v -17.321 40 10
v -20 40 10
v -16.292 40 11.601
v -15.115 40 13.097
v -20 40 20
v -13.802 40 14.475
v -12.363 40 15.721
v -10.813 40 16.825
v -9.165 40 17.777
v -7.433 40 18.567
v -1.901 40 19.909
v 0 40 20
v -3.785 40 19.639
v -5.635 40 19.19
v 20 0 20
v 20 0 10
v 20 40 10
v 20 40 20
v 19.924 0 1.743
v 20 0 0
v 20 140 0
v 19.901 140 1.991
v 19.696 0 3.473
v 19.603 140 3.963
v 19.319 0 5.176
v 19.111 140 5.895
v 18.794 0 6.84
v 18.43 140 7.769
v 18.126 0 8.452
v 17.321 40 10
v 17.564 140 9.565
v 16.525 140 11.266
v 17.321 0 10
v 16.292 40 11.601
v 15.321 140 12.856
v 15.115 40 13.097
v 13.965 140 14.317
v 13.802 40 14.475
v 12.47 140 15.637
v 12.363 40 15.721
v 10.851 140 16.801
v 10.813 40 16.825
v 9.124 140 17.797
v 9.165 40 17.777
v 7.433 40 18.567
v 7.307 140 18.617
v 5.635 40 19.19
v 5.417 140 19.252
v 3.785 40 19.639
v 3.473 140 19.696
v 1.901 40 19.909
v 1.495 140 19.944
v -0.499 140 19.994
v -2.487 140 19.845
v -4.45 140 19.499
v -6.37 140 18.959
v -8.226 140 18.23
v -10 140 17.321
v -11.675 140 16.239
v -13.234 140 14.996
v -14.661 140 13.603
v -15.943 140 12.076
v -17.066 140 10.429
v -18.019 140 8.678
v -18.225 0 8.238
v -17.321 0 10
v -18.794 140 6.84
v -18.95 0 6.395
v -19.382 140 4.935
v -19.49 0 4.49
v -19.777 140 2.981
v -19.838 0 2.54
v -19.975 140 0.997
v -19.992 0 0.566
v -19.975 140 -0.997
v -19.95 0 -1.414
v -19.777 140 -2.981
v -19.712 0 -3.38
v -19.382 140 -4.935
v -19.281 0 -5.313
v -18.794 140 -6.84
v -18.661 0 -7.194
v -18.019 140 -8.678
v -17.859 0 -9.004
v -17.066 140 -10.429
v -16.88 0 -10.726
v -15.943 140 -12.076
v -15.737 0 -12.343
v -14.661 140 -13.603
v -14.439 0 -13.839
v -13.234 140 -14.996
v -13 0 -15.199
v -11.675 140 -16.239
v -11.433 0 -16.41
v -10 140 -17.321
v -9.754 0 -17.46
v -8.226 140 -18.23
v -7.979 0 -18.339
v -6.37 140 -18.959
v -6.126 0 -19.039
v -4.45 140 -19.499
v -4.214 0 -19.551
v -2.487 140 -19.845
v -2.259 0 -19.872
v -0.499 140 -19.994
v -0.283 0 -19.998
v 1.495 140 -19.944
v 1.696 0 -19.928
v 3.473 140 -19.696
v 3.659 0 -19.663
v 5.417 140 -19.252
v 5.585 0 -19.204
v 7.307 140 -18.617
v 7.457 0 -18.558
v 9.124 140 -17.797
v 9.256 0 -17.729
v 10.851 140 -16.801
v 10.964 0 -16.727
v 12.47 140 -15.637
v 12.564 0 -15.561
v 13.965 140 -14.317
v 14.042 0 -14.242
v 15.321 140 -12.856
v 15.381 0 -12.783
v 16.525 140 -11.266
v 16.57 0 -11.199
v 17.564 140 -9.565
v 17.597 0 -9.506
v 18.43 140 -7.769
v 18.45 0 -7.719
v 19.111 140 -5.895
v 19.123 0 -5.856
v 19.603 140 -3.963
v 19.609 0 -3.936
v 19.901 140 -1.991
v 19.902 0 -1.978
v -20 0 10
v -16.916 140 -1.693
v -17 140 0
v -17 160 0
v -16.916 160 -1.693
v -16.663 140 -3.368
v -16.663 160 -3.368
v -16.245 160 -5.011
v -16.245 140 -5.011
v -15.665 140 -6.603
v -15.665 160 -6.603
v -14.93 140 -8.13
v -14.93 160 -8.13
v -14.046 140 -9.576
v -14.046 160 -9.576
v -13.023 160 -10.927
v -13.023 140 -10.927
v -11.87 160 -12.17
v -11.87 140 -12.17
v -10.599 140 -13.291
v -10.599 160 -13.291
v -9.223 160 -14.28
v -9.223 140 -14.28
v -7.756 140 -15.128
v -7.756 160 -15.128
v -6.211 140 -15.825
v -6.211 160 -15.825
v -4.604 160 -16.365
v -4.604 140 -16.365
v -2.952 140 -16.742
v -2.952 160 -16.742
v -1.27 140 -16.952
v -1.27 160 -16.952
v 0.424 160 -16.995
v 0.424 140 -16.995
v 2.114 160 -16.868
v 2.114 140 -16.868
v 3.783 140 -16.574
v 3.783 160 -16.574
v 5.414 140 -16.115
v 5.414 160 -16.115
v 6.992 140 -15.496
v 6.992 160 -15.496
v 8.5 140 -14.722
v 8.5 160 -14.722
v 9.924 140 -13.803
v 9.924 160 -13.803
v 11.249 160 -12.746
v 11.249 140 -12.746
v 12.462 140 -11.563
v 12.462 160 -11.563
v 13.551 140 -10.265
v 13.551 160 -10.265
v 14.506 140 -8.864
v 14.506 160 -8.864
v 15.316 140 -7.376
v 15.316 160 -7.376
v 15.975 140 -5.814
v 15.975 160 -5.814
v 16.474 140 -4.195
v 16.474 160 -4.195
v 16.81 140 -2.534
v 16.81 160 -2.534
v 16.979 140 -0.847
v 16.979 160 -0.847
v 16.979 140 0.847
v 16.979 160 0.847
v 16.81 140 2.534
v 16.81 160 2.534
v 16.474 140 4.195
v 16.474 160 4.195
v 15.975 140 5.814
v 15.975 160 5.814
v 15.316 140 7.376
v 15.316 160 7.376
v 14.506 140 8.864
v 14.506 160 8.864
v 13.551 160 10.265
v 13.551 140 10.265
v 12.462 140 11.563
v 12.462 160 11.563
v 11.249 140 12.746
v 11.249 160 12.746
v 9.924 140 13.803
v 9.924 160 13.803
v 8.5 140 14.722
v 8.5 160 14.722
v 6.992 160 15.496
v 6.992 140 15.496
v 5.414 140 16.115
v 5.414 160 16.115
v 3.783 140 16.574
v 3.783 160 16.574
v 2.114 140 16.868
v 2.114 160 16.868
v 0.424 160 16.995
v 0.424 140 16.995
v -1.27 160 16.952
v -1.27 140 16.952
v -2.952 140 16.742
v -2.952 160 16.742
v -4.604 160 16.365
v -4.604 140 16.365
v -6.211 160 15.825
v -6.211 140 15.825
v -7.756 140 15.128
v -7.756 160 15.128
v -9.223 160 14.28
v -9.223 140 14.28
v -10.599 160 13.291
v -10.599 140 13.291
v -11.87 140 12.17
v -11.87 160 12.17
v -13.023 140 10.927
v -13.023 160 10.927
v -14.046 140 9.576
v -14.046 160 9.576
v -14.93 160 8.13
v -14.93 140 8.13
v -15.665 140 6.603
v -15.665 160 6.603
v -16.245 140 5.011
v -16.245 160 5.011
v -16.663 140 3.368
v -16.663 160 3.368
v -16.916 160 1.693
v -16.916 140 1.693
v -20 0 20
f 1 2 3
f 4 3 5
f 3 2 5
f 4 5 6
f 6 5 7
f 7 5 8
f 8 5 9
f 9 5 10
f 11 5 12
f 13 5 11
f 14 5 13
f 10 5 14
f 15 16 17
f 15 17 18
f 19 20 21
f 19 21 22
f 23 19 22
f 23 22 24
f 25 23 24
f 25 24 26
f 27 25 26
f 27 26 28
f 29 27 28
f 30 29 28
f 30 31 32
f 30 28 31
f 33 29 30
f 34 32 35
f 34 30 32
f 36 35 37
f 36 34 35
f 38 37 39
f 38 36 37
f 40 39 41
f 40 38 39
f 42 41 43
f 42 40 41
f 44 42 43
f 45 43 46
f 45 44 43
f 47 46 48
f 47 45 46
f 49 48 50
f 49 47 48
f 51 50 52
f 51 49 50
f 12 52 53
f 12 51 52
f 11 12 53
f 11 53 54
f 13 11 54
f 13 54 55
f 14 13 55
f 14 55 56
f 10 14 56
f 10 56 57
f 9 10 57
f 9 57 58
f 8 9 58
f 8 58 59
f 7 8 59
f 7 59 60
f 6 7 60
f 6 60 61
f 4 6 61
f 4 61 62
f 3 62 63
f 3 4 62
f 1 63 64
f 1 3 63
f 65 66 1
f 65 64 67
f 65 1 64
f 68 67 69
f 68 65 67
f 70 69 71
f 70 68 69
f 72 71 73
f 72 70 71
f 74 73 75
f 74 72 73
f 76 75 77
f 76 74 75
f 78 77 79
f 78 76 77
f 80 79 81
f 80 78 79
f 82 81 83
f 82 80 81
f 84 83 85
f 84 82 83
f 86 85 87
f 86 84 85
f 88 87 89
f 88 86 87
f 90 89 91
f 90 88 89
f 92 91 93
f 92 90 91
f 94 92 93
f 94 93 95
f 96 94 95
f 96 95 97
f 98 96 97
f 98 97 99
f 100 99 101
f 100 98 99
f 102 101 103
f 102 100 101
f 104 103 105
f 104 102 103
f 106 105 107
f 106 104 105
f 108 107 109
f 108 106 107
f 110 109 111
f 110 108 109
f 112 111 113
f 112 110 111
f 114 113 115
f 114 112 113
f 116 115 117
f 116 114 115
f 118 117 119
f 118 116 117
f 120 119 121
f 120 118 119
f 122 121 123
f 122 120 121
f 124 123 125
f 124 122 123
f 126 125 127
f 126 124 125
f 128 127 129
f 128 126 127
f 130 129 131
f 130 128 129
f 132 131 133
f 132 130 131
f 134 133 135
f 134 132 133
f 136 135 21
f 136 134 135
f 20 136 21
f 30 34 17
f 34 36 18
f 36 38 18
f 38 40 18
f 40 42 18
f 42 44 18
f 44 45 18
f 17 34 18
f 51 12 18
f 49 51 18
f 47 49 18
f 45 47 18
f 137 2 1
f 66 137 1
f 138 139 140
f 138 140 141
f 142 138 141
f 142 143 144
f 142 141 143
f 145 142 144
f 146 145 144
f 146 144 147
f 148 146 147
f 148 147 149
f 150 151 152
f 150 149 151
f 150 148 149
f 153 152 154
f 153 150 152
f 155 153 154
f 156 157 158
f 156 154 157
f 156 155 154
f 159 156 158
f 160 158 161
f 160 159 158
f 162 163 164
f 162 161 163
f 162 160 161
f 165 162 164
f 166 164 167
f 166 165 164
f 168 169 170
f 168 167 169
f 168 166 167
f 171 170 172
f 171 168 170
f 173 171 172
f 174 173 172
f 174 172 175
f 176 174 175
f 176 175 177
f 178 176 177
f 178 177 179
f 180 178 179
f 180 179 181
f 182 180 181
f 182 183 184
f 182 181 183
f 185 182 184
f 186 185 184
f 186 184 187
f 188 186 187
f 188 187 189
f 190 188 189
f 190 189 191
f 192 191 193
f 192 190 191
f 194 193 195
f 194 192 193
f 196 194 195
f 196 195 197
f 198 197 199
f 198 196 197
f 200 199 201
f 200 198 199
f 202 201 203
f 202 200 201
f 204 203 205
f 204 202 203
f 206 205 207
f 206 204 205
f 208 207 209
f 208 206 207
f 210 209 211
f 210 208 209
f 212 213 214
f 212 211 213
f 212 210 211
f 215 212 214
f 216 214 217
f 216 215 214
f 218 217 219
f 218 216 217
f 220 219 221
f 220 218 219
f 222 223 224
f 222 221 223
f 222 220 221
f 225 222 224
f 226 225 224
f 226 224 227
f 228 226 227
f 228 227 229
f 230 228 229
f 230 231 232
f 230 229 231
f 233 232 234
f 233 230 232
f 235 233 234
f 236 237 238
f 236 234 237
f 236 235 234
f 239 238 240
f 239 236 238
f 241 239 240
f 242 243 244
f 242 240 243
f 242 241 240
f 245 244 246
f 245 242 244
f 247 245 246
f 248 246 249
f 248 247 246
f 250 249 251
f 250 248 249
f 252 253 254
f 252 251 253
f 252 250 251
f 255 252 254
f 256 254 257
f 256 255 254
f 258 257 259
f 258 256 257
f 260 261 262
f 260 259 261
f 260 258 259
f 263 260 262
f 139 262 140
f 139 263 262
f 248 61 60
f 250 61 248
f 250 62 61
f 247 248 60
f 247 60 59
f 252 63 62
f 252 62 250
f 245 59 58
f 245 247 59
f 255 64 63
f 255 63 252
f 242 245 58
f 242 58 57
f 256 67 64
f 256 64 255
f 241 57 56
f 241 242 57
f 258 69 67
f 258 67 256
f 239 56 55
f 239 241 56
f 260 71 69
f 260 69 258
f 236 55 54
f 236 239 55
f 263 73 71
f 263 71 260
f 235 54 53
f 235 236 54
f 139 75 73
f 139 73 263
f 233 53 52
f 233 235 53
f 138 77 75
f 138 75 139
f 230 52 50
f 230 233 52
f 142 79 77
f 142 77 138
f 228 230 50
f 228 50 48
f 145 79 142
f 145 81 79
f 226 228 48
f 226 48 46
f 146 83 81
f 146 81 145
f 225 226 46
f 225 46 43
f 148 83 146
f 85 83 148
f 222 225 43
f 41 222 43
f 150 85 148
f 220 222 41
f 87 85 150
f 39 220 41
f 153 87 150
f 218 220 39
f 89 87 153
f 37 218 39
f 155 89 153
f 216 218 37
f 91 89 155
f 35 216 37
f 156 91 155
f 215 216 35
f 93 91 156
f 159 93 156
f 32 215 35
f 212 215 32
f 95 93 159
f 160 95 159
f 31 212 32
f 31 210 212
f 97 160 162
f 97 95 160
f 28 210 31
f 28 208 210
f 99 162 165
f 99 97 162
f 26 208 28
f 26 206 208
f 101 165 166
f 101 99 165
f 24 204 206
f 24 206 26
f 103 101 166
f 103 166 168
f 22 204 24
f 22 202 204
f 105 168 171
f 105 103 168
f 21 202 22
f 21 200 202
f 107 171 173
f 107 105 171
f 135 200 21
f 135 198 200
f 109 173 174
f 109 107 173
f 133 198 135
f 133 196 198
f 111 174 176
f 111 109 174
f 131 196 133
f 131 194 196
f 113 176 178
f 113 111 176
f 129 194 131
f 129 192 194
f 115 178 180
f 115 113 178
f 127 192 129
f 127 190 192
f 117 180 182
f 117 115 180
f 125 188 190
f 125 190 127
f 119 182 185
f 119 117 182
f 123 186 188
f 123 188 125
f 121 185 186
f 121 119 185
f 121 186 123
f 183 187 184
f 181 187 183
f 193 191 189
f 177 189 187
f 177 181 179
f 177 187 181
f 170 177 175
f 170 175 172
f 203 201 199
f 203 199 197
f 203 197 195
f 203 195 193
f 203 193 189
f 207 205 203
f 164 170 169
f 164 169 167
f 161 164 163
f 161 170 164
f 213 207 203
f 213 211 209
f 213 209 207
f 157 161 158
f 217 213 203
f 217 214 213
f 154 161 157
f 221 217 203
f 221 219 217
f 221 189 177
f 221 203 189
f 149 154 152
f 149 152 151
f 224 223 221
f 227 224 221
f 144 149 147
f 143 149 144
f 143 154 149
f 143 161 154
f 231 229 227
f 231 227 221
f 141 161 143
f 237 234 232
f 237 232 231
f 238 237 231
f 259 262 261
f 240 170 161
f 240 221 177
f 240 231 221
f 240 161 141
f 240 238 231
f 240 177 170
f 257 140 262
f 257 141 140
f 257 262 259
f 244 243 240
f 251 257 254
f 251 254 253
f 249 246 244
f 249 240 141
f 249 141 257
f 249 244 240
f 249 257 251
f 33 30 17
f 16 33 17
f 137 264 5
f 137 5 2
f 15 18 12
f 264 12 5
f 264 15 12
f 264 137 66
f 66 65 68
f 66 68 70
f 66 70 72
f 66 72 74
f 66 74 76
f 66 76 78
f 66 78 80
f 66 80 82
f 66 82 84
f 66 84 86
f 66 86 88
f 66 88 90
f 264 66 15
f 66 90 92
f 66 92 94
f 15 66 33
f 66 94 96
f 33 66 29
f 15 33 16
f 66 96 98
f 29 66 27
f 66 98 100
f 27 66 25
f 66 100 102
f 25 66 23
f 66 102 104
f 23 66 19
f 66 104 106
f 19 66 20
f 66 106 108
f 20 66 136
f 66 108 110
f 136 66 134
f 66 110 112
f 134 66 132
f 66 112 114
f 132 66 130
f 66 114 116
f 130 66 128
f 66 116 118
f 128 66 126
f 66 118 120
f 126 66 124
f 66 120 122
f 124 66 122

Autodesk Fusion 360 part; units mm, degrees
sketch "Sketch1" plane through (0, 0, 0) normal (0, 1, 0) x (1, 0, 0)
  circle A0 centre (0, 0) radius 20
  dimension "d1" = 40
extrude "Extrude1" add sketch "Sketch1" along normal blind 140
sketch "Sketch2" plane through (0, 140, 0) normal (0, 1, 0) x (-1, 0, 0)
  circle A0 centre (0, 0) radius 20
  circle A1 centre (0, 0) radius 17
  dimension "d4" = 34
extrude "Extrude2" add sketch "Sketch2" along normal blind 20 contours A1
sketch "Sketch3" plane through (0, 0, 0) normal (1, 0, 0) x (0, 0, -1)
sketch "Sketch4" plane through (0, 0, 0) normal (0, -1, 0) x (1, 0, 0)
  circle A0 centre (0, 0) radius 20
  line L0 (0, 20) -> (-20, 20)
  line L1 (-20, 20) -> (-20, 10)
  line L2 (-20, 10) -> (20, 10)
  line L3 (20, 10) -> (20, 20)
  line L4 (20, 20) -> (0, 20)
extrude "Extrude3" add sketch "Sketch4" against normal blind 40 contours A0 L2 L3 L4 | A0 L0 L1 L2
sketch "Sketch5" plane through (20, 0, 0) normal (1, 0, 0) x (0, 0, -1)
  line L0 (-20, 0) -> (-10, 0)
  line L1 (-10, 0) -> (-10, 40)
  line L2 (-10, 40) -> (-20, 40)
  line L3 (-20, 40) -> (-20, 0)
